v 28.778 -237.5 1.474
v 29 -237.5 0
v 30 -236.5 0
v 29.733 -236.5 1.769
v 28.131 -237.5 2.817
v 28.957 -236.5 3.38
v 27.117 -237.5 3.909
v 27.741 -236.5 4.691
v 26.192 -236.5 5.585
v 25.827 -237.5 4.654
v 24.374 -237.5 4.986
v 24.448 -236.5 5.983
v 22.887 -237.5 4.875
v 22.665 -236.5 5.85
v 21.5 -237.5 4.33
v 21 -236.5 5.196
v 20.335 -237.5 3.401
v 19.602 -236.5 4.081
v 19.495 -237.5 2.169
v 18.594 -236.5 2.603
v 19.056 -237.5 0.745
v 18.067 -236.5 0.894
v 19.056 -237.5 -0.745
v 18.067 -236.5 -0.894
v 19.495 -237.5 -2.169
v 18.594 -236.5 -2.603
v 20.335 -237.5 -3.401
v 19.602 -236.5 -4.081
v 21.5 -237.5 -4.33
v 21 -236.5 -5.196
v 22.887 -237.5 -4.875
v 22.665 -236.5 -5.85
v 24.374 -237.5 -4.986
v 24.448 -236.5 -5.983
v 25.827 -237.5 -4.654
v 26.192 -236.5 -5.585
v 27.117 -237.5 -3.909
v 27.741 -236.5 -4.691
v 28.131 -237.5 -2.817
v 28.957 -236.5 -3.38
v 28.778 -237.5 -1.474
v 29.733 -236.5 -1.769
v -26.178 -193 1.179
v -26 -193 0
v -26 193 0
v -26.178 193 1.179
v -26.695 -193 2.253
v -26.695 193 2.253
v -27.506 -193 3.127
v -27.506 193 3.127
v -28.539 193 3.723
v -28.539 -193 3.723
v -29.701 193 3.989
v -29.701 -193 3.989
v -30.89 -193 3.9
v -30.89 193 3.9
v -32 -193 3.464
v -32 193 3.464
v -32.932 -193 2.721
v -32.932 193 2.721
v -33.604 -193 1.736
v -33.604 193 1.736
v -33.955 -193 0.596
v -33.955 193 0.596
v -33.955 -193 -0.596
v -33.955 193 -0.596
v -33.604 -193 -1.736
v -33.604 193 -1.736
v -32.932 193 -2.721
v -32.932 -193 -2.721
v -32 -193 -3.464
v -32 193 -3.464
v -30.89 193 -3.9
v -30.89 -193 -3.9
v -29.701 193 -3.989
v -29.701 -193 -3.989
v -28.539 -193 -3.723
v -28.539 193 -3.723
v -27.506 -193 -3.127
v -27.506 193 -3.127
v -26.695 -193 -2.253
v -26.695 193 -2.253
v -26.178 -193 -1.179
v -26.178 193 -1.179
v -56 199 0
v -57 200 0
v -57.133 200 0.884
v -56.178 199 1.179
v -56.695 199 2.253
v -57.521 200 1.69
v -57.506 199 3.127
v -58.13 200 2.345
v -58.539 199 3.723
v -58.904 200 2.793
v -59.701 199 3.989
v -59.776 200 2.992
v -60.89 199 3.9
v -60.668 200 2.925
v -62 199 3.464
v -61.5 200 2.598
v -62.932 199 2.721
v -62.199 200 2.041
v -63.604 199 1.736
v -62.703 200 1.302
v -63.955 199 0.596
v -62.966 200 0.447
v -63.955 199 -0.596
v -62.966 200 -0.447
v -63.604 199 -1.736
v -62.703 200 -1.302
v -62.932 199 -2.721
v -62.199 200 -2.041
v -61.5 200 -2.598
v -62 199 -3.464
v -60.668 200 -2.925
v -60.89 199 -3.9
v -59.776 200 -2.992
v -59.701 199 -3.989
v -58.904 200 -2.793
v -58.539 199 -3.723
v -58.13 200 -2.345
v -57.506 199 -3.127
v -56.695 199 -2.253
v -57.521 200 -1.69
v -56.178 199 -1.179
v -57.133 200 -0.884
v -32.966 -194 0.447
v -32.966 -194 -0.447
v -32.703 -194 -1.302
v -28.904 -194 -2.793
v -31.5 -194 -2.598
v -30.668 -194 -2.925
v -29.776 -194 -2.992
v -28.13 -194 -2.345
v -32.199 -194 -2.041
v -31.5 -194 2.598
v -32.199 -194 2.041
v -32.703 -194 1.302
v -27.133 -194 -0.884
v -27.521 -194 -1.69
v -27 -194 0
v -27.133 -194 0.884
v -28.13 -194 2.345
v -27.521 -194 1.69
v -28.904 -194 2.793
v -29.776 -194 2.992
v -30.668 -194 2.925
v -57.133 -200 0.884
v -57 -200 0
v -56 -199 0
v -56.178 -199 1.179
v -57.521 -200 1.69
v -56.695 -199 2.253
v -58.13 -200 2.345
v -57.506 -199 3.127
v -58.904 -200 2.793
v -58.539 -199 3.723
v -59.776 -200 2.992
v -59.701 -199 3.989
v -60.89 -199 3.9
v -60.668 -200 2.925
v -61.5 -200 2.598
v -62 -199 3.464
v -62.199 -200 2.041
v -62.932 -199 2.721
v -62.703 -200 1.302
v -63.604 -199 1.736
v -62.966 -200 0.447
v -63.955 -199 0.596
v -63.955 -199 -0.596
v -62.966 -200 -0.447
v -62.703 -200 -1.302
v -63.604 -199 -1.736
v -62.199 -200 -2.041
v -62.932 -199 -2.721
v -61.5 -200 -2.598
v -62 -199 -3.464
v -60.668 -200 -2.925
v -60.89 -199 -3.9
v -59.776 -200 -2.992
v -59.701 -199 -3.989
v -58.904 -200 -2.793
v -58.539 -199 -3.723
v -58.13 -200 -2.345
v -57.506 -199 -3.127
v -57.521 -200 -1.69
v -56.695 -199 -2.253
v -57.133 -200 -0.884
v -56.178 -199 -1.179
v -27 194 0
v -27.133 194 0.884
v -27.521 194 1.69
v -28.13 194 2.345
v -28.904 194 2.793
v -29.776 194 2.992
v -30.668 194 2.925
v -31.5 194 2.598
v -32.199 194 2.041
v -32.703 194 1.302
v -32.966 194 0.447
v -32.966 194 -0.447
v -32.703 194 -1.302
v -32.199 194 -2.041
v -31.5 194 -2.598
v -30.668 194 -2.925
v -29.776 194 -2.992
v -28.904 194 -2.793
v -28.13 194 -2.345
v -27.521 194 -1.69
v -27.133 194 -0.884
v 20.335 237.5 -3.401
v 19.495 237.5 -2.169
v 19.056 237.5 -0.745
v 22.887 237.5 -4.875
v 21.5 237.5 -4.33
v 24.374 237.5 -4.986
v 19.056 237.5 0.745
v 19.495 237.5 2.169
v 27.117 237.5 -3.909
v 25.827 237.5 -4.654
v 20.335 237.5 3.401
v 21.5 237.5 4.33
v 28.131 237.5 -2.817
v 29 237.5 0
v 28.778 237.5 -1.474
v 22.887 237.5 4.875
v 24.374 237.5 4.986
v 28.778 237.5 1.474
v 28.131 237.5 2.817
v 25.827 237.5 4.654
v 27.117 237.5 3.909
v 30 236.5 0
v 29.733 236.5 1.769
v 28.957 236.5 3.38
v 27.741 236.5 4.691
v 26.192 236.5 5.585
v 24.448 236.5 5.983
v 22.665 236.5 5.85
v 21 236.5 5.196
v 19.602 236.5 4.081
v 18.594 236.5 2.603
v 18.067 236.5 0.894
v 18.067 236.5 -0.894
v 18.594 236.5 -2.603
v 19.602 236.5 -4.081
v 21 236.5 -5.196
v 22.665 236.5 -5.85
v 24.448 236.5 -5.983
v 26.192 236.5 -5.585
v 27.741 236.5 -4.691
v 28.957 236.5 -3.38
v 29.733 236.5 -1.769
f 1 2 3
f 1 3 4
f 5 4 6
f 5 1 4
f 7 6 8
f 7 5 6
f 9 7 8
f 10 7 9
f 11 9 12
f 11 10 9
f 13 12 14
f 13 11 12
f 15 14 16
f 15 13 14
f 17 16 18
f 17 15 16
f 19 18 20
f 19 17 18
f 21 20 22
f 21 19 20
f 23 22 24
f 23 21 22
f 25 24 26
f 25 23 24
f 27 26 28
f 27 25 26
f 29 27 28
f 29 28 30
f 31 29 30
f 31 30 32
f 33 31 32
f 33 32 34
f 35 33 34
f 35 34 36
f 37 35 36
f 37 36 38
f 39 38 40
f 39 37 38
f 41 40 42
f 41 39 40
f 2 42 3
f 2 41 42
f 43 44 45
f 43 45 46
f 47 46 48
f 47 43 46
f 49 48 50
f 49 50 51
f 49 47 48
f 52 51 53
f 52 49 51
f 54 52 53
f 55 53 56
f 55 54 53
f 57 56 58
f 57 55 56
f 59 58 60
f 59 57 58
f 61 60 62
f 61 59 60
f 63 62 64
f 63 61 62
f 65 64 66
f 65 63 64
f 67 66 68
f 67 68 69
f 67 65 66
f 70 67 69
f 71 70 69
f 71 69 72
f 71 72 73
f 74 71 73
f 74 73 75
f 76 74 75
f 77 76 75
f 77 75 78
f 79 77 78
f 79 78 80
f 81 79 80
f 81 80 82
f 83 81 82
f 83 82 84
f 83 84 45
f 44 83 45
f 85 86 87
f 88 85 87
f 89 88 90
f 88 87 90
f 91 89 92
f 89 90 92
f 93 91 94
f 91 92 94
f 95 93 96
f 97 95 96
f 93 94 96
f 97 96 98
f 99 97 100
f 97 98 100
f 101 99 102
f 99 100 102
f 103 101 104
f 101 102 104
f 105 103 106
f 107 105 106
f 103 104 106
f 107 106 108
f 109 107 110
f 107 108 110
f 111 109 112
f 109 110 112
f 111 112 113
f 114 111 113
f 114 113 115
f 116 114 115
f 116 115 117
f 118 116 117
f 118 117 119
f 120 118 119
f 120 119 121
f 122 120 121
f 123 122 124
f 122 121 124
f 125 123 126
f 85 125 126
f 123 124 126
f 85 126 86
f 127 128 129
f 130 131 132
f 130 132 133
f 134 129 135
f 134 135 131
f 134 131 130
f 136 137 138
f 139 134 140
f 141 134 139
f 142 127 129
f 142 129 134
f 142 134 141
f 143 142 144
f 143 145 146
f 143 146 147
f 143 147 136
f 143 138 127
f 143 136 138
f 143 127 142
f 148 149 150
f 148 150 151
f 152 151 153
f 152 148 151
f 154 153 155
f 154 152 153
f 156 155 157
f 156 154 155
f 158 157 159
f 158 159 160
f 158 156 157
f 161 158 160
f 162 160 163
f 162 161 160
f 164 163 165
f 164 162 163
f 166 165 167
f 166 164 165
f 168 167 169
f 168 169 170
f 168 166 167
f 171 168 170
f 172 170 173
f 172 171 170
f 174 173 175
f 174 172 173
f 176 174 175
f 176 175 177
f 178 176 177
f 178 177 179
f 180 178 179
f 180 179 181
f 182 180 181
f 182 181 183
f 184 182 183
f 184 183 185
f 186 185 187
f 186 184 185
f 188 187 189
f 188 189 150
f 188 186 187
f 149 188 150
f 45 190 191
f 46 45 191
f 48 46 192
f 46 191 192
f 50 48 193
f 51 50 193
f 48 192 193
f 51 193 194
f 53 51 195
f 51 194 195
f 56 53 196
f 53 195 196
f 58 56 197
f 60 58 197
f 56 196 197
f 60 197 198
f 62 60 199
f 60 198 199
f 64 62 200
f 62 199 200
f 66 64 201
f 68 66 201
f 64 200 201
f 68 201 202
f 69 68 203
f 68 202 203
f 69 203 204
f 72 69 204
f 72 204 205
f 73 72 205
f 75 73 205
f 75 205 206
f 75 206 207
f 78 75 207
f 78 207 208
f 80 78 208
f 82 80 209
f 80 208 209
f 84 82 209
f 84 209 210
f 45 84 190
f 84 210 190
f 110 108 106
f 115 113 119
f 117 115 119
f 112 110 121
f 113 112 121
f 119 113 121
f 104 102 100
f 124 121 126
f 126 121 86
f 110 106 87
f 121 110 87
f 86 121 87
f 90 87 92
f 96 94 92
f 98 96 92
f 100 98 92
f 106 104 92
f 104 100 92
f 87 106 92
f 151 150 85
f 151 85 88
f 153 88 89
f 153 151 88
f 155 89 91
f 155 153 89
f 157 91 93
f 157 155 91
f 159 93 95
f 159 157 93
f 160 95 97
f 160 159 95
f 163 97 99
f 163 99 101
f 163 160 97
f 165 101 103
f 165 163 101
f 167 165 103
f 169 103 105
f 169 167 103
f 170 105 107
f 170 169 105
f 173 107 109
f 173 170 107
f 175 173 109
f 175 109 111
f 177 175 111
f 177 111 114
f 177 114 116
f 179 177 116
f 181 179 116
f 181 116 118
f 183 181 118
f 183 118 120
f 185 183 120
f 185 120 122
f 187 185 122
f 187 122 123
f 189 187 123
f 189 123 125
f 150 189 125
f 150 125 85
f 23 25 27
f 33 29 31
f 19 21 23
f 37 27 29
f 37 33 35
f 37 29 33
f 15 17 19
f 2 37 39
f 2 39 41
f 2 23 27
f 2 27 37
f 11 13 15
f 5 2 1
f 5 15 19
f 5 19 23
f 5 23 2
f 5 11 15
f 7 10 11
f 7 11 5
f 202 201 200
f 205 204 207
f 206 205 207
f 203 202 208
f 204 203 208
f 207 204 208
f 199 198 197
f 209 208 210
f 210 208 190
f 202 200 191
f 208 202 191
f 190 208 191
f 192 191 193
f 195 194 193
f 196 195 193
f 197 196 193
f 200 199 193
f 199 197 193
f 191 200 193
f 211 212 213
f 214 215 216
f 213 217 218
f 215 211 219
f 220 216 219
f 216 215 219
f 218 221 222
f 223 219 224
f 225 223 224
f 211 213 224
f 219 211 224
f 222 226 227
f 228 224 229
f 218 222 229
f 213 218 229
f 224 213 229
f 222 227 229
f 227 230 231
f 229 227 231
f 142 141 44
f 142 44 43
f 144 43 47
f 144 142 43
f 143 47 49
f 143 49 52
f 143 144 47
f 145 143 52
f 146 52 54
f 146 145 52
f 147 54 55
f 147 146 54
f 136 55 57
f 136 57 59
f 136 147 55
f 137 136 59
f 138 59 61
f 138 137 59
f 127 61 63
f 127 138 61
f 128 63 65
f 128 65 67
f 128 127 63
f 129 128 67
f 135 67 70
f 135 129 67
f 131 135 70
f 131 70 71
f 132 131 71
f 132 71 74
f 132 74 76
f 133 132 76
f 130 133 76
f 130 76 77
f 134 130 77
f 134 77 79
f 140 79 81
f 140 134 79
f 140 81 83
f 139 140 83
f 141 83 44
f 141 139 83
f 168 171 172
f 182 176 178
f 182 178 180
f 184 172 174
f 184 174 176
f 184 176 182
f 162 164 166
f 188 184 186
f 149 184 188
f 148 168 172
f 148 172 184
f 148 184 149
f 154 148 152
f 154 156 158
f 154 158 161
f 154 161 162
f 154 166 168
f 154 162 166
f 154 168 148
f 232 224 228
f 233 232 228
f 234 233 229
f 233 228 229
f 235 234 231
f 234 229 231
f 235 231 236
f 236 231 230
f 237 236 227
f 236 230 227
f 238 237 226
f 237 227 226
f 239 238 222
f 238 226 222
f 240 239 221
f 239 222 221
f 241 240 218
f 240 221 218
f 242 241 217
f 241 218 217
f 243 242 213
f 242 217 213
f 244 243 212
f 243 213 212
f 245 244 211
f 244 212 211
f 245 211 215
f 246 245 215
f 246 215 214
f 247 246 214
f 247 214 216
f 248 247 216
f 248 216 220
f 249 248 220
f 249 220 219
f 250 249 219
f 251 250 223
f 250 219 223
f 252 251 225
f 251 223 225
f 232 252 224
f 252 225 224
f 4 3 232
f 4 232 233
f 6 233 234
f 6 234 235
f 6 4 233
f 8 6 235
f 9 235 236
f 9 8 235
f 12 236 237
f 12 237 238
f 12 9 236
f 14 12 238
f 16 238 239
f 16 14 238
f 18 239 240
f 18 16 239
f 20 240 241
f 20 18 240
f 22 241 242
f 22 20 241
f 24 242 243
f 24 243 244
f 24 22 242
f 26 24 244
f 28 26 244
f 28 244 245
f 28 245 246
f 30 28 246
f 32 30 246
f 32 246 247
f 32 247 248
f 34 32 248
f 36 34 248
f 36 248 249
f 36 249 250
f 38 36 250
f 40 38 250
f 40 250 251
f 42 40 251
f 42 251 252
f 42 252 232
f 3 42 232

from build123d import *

# Parameters (mm, degrees)
F3_R      = 4
F4_DEPTH  = 194
F5_SIZE   = 1
F6_R      = 6
F7_DEPTH  = 237.5
F8_SIZE   = 1
F9_R      = 4
F10_DEPTH = 200
F11_SIZE  = 1


with BuildPart() as f4:
    # F3 (on Front) → F4 (new body, symmetric)
    with BuildSketch(Plane.XZ):
        with Locations((-30, 0)):
            Circle(F3_R)
    extrude(amount=F4_DEPTH, both=True)

    # F5
    f5_edges = [f4.edges().sort_by_distance(p)[0] for p in [
        (-34, -194, 0),
        (-34, 194, 0),
    ]]
    chamfer(f5_edges, length=F5_SIZE)


with BuildPart() as f7:
    # F6 (on Front) → F7 (new body, symmetric)
    with BuildSketch(Plane.XZ):
        with Locations((24, 0)):
            Circle(F6_R)
    extrude(amount=F7_DEPTH, both=True)

    # F8
    f8_edges = [f7.edges().sort_by_distance(p)[0] for p in [
        (18, -237.5, 0),
        (18, 237.5, 0),
    ]]
    chamfer(f8_edges, length=F8_SIZE)


with BuildPart() as f10:
    # F9 (on Front) → F10 (new body, symmetric)
    with BuildSketch(Plane.XZ):
        with Locations((-60, 0)):
            Circle(F9_R)
    extrude(amount=F10_DEPTH, both=True)

    # F11
    f11_edges = [f10.edges().sort_by_distance(p)[0] for p in [
        (-64, 200, 0),
        (-64, -200, 0),
    ]]
    chamfer(f11_edges, length=F11_SIZE)


solid = Compound([f4.part, f7.part, f10.part])
